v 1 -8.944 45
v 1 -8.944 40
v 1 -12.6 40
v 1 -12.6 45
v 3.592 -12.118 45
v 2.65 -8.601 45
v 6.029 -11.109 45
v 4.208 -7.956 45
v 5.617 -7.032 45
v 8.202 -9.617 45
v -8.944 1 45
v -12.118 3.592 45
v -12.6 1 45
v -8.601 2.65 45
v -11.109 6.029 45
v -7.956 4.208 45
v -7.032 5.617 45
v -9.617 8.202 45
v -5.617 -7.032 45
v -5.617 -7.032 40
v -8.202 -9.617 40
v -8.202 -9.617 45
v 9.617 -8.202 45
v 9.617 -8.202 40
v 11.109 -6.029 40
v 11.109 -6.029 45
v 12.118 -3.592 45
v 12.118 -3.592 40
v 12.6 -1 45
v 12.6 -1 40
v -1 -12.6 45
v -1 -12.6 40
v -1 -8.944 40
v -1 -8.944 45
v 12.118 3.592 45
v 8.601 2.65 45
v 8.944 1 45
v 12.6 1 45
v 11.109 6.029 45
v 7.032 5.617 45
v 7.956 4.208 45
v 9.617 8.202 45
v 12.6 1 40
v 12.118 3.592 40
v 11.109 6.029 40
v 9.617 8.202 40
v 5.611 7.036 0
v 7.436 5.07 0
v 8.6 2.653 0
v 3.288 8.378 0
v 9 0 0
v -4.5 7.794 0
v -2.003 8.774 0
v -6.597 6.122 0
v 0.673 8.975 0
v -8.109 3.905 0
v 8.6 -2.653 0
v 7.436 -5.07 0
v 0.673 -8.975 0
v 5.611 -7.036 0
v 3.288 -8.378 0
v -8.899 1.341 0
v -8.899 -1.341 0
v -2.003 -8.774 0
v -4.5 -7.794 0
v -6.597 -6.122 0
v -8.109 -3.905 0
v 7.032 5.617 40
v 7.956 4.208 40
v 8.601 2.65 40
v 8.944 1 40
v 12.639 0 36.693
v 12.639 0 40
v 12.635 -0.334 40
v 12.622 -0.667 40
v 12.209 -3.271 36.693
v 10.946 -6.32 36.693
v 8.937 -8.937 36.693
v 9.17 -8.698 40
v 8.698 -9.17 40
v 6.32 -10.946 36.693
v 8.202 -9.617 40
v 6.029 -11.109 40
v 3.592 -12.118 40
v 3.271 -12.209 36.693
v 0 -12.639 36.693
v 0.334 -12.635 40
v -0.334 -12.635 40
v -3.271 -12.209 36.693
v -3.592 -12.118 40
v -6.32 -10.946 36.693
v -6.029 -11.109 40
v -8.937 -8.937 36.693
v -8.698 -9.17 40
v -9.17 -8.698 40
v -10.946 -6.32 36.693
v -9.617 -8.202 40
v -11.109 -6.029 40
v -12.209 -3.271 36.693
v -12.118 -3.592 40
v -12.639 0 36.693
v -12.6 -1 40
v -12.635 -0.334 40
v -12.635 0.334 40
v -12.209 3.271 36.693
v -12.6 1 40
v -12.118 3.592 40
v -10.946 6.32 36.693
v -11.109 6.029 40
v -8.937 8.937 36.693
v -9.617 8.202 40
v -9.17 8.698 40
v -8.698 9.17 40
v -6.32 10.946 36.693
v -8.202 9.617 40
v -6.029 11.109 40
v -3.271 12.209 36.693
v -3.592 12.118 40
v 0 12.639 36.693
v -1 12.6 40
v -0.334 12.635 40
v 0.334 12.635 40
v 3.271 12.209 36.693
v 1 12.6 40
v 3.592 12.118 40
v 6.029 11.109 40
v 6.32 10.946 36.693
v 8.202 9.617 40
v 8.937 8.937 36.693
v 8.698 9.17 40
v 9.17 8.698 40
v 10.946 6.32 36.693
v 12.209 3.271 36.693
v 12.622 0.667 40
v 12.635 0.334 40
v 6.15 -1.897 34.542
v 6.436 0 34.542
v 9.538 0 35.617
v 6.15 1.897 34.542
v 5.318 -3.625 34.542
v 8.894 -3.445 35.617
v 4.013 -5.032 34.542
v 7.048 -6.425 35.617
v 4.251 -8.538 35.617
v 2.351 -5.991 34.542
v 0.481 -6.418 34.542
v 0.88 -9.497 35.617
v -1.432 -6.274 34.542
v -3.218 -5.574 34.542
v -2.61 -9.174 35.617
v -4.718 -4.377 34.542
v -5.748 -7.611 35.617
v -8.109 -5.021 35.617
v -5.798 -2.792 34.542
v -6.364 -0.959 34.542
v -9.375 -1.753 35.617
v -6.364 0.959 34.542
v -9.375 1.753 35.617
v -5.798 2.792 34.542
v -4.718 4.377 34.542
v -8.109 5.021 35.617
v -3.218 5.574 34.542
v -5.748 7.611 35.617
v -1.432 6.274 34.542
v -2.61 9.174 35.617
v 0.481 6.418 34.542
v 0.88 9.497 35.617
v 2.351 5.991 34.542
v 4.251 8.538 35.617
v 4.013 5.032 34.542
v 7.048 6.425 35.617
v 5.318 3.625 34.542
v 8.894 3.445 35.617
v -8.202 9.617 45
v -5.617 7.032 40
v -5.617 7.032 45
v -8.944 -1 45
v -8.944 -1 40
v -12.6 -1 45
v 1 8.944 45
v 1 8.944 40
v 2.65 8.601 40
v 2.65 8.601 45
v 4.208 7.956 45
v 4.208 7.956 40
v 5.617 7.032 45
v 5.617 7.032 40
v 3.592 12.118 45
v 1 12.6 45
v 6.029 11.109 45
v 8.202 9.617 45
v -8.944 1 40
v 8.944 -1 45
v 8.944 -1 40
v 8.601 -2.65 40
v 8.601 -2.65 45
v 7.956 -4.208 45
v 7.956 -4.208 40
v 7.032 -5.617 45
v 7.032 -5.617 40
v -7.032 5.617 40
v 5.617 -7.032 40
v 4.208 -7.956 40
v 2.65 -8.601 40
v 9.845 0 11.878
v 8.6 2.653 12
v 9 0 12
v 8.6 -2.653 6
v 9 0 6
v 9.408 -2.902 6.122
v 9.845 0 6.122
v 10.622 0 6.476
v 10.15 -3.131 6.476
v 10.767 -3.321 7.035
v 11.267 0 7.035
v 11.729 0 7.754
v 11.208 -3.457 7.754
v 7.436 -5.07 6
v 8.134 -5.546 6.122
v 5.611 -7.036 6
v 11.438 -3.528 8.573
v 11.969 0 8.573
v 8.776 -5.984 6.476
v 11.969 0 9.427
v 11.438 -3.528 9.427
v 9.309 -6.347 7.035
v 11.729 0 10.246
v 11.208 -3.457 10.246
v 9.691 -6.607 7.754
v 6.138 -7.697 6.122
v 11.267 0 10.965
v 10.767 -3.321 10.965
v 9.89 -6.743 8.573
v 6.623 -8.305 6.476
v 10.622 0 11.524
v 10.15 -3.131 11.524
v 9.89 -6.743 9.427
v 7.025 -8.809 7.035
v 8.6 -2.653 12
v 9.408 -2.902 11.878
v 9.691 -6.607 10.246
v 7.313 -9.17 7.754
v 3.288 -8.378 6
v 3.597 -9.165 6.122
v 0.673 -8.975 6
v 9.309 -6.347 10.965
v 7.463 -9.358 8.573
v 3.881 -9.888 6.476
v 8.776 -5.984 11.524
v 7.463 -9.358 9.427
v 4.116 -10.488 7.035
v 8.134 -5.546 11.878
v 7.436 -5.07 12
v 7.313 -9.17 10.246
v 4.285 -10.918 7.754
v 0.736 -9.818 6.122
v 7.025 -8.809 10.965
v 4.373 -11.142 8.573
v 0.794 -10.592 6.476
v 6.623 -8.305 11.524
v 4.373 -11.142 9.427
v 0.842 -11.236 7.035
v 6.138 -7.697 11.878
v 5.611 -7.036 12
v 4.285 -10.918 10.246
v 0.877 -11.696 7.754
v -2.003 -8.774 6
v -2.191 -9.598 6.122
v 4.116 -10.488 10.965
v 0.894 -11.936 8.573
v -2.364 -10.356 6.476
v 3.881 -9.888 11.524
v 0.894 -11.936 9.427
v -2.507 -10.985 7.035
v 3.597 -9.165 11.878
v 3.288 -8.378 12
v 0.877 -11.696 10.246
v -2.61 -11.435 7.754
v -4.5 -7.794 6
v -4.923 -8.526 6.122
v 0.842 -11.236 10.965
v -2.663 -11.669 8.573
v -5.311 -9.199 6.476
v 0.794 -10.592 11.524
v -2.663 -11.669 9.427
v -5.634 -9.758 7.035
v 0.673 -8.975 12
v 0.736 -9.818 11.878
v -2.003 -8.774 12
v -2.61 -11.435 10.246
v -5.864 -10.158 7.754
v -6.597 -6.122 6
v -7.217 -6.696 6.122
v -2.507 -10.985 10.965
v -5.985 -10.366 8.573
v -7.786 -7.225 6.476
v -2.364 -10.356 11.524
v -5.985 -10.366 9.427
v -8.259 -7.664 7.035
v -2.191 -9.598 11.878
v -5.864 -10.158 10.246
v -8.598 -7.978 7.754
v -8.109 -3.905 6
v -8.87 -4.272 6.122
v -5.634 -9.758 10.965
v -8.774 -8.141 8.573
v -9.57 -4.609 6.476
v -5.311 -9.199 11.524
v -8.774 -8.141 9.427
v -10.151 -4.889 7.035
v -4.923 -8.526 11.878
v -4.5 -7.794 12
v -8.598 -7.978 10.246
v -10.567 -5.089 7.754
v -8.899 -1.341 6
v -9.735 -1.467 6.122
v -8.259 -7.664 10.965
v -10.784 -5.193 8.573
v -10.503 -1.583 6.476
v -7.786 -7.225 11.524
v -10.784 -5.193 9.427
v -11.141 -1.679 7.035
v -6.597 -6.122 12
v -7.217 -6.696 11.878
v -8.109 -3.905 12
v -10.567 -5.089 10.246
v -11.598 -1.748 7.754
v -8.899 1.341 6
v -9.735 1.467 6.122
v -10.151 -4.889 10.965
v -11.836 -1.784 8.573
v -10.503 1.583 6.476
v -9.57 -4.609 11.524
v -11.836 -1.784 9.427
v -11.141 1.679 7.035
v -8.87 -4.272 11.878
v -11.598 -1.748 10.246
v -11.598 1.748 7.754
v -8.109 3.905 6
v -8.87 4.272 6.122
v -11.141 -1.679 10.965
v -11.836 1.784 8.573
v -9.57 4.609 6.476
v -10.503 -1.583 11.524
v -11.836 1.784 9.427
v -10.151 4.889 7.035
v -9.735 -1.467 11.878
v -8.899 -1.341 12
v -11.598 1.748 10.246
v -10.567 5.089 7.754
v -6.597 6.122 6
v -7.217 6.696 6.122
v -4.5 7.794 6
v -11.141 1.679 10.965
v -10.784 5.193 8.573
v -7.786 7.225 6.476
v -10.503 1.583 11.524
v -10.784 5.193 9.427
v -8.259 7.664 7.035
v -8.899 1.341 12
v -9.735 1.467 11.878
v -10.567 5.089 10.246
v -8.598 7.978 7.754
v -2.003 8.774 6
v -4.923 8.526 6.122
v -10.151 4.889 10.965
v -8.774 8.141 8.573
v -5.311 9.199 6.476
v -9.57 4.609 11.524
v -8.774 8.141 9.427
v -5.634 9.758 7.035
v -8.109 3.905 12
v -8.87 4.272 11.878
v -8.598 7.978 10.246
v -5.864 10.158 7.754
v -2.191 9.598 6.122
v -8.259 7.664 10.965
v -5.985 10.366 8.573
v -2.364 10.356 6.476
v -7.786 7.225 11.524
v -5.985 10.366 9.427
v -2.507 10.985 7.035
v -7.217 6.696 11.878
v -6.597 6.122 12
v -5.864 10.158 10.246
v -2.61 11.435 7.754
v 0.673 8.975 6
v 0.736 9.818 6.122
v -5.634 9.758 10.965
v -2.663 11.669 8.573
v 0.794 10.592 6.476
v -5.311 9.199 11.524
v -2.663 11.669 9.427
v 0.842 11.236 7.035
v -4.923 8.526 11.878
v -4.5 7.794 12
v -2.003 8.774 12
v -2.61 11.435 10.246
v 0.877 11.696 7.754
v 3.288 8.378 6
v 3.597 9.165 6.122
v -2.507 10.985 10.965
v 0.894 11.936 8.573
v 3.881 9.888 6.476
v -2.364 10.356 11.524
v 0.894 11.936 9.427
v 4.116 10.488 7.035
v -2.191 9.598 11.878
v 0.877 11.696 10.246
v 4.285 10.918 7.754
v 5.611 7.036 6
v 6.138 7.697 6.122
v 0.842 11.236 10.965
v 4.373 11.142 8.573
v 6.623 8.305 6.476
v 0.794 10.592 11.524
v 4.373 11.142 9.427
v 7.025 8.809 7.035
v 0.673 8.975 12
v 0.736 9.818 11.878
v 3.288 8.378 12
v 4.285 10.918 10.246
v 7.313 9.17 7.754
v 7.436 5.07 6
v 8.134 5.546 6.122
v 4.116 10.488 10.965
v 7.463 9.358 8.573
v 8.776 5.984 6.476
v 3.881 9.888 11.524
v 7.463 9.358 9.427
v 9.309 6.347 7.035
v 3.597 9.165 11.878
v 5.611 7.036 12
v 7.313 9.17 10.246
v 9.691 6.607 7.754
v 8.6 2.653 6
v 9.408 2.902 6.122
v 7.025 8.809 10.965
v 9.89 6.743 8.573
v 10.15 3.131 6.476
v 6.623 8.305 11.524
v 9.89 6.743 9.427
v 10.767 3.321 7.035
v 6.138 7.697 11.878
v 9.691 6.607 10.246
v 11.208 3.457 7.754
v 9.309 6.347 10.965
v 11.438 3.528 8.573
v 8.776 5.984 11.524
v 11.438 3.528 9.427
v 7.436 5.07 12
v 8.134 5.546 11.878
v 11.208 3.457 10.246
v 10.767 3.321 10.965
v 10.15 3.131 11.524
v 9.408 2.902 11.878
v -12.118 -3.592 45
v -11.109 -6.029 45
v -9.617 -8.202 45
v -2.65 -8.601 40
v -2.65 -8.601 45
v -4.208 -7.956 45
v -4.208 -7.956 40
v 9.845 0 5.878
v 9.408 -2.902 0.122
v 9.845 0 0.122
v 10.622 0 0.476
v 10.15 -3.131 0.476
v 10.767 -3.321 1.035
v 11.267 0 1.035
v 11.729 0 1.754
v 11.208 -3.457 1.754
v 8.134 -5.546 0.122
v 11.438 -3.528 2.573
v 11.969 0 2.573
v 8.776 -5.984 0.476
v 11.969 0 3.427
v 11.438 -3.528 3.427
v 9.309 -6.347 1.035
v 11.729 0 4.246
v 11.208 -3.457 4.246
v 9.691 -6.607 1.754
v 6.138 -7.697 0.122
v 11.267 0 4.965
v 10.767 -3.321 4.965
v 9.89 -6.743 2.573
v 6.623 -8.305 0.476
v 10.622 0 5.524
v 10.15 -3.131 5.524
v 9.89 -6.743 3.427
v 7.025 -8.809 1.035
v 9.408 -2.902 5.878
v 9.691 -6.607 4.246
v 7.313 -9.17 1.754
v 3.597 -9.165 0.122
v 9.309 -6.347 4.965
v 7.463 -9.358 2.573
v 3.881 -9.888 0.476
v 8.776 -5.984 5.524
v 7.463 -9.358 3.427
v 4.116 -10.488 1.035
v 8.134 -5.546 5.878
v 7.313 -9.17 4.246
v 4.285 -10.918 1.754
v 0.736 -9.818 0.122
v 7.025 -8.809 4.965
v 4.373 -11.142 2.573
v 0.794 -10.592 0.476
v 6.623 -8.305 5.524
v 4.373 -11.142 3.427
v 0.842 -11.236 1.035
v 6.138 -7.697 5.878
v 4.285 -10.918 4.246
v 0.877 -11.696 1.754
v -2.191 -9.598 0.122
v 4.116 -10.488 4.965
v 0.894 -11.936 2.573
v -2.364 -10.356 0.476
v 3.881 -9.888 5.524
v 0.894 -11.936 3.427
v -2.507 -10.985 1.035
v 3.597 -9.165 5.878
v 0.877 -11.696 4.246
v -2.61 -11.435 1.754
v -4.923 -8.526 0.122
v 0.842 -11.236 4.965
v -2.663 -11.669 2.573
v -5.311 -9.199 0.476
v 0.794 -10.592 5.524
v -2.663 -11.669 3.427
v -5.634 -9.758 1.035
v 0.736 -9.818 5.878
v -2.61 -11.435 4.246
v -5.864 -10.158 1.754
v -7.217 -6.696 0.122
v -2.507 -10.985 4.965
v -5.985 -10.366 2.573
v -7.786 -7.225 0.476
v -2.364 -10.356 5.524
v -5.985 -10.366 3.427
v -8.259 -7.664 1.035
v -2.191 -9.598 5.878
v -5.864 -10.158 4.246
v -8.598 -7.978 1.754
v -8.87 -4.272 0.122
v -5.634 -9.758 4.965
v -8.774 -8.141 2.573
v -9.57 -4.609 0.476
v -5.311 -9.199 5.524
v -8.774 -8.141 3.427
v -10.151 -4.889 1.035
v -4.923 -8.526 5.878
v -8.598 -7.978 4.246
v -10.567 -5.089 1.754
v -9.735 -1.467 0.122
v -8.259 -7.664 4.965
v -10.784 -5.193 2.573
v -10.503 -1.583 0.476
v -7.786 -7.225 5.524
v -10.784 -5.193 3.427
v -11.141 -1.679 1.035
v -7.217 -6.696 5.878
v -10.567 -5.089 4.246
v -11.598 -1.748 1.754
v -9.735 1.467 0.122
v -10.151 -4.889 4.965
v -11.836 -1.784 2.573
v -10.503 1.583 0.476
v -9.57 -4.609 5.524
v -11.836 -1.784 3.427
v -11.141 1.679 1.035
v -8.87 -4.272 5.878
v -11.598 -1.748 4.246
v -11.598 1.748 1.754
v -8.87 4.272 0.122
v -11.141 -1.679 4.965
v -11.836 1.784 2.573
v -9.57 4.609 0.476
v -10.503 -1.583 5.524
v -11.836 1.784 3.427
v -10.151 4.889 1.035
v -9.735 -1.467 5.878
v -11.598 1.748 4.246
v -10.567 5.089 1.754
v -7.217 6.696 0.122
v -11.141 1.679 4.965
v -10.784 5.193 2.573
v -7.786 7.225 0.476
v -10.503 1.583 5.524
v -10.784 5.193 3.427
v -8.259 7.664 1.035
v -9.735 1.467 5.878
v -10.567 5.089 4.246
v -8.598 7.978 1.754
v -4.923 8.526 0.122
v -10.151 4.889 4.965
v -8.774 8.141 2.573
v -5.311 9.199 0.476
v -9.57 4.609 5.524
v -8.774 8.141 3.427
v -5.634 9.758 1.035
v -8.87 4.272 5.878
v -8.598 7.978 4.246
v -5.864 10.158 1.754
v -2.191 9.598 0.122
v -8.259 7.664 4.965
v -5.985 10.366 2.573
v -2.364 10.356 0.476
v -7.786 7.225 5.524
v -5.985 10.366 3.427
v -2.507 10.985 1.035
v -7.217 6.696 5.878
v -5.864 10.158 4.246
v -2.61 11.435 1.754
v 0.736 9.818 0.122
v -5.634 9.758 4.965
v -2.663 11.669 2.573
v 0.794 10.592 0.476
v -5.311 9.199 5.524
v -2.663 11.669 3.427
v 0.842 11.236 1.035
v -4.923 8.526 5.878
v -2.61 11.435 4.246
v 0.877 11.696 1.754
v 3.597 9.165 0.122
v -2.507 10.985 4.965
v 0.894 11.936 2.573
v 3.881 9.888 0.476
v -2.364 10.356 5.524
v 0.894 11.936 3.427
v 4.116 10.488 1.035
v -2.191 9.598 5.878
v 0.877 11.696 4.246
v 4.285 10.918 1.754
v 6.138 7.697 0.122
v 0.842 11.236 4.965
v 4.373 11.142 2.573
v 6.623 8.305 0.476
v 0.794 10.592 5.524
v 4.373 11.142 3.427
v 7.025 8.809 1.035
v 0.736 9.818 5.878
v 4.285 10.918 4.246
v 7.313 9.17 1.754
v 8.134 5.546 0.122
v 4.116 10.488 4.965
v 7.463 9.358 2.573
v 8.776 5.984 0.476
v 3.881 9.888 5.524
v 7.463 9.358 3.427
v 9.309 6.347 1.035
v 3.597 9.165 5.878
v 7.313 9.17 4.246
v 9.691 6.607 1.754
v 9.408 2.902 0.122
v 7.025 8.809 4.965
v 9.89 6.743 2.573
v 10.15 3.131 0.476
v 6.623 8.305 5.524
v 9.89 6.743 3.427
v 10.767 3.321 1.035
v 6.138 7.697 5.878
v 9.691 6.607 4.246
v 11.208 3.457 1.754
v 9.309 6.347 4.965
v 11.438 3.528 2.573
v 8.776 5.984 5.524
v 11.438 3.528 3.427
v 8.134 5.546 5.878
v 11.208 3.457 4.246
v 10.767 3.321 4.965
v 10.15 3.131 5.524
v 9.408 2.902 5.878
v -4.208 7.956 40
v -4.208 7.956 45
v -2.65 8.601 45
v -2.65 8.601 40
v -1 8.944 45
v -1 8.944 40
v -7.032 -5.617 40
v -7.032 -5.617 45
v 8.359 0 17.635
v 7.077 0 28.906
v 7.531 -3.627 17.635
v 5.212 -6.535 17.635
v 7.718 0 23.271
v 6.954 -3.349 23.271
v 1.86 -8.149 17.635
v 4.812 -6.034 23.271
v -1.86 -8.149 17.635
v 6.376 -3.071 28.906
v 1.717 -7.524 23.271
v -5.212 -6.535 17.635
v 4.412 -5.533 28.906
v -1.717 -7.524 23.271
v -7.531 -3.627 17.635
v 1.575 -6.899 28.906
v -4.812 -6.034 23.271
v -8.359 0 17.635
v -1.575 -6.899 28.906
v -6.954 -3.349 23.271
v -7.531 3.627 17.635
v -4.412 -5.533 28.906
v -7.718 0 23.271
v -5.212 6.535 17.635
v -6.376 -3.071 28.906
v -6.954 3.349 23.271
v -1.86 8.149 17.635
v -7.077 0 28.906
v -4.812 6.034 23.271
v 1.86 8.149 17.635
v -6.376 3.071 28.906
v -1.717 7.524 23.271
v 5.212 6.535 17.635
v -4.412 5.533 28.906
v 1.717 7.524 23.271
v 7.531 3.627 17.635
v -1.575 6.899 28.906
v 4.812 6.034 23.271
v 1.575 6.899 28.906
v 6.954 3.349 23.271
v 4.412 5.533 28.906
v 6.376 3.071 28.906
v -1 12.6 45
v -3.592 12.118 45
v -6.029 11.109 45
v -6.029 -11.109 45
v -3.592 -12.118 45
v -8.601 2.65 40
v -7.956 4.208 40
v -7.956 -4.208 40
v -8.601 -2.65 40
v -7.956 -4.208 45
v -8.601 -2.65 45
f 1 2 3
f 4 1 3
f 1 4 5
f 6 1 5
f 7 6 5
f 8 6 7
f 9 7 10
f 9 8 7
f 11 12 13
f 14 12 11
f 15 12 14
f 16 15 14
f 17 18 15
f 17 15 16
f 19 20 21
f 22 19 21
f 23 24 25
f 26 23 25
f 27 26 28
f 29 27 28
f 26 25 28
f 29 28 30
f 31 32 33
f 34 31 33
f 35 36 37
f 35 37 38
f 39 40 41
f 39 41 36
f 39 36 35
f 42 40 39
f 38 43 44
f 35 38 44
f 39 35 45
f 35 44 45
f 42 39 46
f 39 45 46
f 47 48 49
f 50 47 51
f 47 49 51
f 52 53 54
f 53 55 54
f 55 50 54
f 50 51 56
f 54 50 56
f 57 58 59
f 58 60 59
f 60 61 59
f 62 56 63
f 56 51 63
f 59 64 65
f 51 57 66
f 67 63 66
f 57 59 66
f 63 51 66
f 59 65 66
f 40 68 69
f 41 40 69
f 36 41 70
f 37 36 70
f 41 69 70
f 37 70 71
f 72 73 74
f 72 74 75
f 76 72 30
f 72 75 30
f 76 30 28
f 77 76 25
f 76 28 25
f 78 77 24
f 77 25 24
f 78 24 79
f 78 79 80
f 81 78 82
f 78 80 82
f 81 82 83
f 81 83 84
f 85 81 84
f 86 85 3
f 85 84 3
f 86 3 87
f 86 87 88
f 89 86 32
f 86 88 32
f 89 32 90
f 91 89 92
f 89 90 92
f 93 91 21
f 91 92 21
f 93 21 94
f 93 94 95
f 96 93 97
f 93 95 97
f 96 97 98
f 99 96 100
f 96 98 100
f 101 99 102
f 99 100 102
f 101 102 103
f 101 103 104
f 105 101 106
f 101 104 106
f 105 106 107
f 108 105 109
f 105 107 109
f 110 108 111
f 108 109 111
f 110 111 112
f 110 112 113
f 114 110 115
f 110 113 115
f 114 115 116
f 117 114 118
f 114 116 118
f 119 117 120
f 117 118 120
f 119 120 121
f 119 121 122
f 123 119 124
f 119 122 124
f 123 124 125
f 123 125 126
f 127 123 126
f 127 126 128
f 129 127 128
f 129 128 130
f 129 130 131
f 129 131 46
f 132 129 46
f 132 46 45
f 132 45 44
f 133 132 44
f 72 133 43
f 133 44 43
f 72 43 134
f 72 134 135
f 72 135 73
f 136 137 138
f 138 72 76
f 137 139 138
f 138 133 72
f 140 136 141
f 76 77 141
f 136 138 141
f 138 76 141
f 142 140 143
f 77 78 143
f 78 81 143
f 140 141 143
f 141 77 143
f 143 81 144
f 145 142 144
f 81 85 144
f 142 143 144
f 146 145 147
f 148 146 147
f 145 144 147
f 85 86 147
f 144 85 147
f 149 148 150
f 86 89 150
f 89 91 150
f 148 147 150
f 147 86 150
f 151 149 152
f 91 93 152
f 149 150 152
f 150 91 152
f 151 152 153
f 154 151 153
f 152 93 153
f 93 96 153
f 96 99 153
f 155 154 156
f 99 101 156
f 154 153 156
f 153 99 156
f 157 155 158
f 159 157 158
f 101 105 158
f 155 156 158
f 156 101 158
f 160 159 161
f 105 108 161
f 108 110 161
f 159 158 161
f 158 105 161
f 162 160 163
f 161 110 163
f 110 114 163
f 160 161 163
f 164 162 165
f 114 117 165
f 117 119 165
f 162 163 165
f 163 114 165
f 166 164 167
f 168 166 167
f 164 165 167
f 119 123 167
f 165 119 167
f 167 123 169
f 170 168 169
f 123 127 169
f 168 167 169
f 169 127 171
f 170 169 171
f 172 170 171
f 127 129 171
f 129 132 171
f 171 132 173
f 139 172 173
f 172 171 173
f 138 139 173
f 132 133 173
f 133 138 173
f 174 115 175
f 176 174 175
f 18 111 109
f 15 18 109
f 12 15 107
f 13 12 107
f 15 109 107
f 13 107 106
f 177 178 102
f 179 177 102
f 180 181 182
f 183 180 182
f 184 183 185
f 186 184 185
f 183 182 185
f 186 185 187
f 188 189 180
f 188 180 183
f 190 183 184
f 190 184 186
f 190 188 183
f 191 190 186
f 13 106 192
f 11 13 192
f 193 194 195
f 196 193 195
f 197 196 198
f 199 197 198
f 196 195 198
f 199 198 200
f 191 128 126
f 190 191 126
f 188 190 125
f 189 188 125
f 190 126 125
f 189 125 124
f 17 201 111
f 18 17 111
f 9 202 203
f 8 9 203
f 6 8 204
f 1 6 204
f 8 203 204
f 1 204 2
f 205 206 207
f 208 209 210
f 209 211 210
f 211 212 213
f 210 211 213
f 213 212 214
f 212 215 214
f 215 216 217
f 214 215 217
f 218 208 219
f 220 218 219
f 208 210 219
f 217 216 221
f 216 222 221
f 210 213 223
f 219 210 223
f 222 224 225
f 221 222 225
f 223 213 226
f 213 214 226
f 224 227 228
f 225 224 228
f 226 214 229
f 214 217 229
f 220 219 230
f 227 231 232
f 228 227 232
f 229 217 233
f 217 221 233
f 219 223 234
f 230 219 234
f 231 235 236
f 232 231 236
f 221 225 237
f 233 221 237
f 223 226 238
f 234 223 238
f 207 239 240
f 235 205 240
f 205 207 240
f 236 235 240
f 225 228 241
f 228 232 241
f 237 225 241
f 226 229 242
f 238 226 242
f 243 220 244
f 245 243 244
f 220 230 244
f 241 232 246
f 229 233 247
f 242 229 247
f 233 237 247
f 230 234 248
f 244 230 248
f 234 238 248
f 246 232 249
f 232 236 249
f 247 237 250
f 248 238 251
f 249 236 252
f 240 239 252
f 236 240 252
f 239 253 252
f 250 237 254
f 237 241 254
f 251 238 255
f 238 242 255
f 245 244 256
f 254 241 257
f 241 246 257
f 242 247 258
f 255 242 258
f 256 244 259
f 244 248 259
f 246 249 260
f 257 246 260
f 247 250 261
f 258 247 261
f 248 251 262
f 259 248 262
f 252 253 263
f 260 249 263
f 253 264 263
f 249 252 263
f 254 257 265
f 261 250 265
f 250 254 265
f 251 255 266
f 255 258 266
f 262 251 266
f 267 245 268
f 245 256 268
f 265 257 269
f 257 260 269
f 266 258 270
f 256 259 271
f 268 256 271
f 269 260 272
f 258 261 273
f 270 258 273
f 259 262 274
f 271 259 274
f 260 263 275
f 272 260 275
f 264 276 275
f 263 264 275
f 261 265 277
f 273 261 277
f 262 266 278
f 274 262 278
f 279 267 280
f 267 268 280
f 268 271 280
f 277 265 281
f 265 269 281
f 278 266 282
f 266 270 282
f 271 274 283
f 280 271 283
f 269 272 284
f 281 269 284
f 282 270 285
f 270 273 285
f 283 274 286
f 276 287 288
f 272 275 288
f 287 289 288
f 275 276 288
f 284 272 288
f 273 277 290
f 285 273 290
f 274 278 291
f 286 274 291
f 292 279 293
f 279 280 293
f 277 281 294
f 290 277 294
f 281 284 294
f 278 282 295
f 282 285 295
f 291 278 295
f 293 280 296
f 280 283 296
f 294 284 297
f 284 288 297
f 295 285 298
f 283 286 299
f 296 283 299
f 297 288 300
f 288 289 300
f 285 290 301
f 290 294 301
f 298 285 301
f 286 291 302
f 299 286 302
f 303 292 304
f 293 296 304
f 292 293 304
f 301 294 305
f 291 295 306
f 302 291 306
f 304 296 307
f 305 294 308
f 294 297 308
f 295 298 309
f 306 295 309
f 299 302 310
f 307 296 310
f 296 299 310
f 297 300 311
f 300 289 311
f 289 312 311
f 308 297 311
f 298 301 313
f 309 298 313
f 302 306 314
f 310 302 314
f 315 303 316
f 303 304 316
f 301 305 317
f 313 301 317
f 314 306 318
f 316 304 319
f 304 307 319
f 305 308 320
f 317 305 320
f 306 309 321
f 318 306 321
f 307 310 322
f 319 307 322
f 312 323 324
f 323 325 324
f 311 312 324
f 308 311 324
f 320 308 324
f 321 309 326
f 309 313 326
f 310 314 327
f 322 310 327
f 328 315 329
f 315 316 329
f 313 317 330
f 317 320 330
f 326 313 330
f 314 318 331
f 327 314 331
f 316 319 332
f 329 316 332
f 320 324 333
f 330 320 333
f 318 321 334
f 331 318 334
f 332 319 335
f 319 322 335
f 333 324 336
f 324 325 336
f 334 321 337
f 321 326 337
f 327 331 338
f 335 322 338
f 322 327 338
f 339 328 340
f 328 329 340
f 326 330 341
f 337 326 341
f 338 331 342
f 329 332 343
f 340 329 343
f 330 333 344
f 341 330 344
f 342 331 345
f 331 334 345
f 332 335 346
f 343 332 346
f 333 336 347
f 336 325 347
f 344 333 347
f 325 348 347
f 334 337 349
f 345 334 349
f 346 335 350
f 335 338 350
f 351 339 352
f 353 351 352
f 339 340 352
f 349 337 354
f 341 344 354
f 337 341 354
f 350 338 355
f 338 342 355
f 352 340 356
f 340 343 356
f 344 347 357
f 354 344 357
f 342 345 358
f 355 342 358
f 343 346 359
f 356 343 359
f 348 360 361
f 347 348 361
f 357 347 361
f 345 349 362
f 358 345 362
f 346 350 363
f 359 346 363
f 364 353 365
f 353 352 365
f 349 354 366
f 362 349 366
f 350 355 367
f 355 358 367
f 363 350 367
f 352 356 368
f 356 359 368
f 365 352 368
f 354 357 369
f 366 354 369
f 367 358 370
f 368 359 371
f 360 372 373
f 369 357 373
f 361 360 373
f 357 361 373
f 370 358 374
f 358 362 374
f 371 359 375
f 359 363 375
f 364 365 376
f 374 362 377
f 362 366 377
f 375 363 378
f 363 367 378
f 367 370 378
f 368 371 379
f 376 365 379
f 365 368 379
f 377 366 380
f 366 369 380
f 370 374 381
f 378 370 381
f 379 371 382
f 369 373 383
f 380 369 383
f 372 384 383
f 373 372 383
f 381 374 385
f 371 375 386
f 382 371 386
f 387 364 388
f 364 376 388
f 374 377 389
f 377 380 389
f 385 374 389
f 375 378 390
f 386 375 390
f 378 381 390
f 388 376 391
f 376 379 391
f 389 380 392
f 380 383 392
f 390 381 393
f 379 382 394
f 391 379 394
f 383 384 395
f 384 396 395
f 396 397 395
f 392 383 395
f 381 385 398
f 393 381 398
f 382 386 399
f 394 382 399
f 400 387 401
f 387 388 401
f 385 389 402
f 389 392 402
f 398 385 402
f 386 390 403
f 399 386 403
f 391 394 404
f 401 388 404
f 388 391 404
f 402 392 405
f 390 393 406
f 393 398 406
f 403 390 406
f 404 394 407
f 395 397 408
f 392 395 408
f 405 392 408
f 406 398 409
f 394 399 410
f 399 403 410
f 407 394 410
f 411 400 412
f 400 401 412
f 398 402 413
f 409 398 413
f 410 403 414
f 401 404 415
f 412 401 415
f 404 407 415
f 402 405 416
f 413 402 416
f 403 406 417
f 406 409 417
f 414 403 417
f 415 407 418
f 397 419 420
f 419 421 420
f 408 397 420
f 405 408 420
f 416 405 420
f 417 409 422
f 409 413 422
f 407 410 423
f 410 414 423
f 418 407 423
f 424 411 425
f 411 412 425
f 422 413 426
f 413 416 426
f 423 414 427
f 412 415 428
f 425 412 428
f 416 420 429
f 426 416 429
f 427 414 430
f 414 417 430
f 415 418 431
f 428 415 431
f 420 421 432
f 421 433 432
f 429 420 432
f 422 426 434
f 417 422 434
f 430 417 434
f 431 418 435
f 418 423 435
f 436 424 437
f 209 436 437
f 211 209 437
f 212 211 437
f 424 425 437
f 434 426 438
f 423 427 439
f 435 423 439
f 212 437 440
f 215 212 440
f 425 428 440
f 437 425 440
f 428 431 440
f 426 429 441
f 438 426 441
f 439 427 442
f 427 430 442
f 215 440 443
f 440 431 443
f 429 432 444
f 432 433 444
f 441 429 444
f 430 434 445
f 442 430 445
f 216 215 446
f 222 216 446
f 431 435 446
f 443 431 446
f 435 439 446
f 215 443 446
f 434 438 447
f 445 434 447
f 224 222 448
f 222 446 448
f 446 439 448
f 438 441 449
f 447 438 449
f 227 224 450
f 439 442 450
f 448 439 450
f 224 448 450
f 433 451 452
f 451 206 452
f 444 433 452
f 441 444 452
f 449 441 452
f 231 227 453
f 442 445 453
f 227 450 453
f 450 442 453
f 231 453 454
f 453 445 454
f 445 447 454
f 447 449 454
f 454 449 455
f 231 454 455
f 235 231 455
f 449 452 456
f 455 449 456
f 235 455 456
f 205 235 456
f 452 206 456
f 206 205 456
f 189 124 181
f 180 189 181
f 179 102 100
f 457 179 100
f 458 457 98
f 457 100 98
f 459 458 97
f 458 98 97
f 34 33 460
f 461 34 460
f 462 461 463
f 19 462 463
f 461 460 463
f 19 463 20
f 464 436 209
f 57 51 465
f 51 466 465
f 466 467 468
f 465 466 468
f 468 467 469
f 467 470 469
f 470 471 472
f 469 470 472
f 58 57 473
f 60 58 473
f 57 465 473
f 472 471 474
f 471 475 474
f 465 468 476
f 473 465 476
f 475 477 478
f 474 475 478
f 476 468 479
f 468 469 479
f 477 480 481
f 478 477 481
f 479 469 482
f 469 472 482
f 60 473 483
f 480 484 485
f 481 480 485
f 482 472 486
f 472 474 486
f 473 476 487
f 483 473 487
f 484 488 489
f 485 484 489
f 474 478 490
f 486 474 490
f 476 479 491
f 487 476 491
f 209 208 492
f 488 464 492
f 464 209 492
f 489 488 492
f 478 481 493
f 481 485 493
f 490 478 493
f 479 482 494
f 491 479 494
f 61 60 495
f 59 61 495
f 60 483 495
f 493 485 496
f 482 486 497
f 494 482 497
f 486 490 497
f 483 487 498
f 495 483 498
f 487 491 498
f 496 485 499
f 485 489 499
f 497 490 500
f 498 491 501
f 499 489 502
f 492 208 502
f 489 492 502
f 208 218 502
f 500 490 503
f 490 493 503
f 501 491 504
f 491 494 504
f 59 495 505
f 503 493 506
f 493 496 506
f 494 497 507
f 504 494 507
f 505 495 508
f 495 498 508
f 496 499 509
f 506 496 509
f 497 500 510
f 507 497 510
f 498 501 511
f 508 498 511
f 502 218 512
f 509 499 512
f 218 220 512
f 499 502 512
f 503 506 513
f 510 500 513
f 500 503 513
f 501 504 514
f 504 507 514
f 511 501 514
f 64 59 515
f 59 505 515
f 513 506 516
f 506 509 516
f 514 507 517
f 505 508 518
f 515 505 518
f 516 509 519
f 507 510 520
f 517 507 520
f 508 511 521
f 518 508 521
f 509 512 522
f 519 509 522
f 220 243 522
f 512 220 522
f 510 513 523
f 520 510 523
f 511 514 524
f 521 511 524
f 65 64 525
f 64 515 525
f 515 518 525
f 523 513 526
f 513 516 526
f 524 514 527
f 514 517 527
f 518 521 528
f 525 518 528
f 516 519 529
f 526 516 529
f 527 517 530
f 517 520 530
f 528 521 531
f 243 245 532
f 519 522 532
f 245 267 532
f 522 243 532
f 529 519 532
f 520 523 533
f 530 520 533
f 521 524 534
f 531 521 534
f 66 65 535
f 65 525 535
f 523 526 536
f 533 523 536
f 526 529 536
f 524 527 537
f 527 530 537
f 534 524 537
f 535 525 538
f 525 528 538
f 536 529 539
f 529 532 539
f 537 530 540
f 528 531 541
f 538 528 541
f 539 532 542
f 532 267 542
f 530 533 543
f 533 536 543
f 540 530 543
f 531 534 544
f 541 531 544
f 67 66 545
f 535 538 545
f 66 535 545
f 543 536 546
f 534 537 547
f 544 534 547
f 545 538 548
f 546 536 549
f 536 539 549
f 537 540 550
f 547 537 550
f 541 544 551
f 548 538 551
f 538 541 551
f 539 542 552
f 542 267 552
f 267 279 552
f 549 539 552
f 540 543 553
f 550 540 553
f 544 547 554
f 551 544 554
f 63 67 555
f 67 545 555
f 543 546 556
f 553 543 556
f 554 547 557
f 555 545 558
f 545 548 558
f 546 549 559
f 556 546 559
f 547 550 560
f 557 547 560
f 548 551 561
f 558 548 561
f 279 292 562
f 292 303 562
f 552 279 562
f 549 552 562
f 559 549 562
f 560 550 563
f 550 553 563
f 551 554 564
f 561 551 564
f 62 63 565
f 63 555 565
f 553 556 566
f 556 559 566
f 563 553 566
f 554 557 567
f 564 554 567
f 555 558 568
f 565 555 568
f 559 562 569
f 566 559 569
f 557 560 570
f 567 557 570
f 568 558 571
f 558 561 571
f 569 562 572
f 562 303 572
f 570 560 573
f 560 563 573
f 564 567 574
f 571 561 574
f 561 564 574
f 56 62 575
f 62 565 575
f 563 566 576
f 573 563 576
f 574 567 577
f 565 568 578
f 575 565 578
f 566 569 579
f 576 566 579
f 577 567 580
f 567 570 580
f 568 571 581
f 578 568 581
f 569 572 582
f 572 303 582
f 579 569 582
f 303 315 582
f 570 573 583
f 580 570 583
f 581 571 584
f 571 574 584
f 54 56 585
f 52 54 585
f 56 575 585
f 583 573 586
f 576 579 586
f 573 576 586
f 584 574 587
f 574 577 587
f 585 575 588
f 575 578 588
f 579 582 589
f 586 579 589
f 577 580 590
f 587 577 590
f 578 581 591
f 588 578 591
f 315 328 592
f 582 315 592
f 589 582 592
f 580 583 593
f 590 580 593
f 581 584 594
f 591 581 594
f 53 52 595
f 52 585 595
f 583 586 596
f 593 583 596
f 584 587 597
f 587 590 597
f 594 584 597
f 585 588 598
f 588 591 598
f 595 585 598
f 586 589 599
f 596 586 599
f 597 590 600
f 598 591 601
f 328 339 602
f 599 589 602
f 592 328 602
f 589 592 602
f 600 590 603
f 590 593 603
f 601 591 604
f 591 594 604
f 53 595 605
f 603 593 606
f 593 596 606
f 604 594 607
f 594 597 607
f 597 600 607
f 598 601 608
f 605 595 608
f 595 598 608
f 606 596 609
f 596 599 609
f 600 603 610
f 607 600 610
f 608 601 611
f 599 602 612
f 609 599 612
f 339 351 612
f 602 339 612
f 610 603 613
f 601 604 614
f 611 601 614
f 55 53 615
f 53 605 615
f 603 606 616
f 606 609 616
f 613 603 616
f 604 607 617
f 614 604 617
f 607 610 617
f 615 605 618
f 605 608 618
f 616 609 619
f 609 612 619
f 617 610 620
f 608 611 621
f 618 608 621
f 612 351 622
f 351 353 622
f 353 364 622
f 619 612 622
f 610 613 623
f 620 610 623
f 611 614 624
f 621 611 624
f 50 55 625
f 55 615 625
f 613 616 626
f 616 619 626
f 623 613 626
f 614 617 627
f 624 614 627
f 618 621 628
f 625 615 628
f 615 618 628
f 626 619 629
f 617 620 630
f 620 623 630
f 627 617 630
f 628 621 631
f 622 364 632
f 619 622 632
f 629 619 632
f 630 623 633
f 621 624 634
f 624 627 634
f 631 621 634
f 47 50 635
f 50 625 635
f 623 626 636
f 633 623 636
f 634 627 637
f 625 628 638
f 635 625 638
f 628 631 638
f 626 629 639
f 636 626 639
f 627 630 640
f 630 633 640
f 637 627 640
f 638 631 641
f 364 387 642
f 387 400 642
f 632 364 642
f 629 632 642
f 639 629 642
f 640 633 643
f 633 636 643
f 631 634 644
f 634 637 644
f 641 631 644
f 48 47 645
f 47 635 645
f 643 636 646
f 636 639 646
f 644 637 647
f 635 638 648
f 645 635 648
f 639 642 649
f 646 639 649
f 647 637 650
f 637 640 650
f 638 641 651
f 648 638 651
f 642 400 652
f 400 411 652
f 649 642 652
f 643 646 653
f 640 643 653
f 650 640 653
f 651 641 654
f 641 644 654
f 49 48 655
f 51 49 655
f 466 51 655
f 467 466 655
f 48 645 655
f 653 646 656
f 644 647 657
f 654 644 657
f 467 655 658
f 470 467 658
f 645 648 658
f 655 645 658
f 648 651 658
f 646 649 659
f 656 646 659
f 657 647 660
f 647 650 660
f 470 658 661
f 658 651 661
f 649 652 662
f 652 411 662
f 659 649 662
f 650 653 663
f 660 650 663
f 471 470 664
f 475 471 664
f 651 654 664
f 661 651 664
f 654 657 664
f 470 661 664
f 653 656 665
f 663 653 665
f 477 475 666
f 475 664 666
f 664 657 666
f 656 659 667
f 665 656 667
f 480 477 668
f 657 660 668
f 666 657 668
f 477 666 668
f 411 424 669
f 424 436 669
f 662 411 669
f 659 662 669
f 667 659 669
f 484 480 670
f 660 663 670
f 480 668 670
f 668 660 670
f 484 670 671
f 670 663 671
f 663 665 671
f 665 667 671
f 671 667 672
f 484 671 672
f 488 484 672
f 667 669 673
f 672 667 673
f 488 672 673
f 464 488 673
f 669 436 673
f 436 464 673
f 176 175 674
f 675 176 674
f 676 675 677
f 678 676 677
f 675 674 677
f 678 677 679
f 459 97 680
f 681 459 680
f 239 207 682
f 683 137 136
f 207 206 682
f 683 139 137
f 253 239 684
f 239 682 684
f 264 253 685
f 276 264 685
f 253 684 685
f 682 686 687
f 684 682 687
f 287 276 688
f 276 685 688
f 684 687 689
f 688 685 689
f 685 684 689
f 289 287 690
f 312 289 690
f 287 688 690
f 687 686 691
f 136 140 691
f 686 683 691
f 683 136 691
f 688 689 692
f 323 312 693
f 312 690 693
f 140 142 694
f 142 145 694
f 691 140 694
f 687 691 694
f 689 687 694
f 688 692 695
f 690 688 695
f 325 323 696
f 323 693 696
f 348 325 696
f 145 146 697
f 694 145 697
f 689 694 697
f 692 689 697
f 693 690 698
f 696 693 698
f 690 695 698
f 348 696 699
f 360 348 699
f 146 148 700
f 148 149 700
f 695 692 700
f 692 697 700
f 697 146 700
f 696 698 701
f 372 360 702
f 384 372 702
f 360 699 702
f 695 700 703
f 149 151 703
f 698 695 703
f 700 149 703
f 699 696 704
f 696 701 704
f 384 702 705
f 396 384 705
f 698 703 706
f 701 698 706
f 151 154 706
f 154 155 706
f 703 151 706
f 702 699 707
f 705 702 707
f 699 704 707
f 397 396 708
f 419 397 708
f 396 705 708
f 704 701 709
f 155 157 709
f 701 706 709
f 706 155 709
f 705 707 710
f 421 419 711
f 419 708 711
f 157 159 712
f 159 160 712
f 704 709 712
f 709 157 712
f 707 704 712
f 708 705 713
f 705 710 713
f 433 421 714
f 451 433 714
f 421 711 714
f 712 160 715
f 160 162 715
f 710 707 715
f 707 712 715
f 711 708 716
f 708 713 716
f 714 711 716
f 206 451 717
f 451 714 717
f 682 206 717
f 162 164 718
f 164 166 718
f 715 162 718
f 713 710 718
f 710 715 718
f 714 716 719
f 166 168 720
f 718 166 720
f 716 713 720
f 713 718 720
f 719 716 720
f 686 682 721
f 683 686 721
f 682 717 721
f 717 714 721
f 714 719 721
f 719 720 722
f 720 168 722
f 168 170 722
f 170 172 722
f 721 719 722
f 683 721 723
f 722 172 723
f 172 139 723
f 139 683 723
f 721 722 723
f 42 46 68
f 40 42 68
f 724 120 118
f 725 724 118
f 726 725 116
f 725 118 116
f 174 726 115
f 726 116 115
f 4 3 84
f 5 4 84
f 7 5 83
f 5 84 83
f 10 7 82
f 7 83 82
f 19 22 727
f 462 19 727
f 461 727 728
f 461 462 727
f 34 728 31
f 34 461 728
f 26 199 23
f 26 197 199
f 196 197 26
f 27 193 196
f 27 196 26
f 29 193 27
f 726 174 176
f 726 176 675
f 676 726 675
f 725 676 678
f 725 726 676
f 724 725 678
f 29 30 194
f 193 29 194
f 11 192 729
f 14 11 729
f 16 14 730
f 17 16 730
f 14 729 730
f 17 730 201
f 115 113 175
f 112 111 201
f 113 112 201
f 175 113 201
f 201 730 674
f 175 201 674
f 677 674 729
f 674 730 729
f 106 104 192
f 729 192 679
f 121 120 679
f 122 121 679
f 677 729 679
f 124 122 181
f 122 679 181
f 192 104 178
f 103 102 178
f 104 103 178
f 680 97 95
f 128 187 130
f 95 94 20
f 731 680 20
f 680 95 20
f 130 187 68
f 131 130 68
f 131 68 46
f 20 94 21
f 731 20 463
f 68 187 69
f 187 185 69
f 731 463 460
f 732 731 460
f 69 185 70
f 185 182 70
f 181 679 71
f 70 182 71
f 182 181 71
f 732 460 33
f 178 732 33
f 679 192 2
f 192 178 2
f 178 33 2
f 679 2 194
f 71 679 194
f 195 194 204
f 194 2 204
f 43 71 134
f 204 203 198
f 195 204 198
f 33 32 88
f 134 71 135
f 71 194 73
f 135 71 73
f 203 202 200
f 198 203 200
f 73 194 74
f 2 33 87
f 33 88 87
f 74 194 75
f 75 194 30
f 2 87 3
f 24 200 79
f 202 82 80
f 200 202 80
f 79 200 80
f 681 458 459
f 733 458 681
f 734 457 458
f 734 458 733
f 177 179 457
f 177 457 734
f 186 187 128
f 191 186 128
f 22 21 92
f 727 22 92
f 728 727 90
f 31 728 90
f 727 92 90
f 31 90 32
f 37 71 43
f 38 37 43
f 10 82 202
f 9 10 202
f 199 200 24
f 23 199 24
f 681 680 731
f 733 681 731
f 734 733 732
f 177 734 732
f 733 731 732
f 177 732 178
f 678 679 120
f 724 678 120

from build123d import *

# Parameters (mm, degrees)
F3_DEPTH = 5


# Not quite as in the source:
# - after a boolean that leaves OpenCascade's solid faulty, fix() repairs it


with BuildPart() as f1:
    # F0 (on Front) → F1 (revolve)
    with BuildSketch(Plane.XZ):
        with BuildLine():
            Line((0, 40), (0, 0))
            Line((0, 0), (9, 0))
            ThreePointArc((9, 0), (12, 3), (9, 6))
            ThreePointArc((9, 6), (12, 9), (9, 12))
            Line((9, 12), (6.4358137697, 34.5418713987))
            Line((6.4358137697, 34.5418713987), (12.6394796214, 36.6926416755))
            Line((12.6394796214, 36.6926416755), (12.6394796214, 40))
            Line((12.6394796214, 40), (0, 40))
        make_face()
    revolve(axis=Axis((0, 0, 20), (0, 0, -1)))

    # F2 (on face) → F3 (join)
    with BuildSketch(Plane.XY.offset(40)):
        with BuildLine():
            ThreePointArc((-8.94427191, 1), (-8.3149157926, 3.4441508913), (-7.0316621015, 5.6174485392))
            Line((-7.0316621015, 5.6174485392), (-9.6165524738, 8.2023389114))
            ThreePointArc((-9.6165524738, 8.2023389114), (-11.6773565238, 4.8369194448), (-12.5998589317, 1))
            Line((-12.5998589317, 1), (-8.94427191, 1))
        make_face()
        with BuildLine():
            ThreePointArc((-1, 12.5998589317), (-4.8369194448, 11.6773565238), (-8.2023389114, 9.6165524738))
            Line((-8.2023389114, 9.6165524738), (-5.6174485392, 7.0316621015))
            ThreePointArc((-5.6174485392, 7.0316621015), (-3.4441508913, 8.3149157926), (-1, 8.94427191))
            Line((-1, 8.94427191), (-1, 12.5998589317))
        make_face()
        with BuildLine():
            ThreePointArc((8.2023389114, 9.6165524738), (4.8369194448, 11.6773565238), (1, 12.5998589317))
            Line((1, 12.5998589317), (1, 8.94427191))
            ThreePointArc((1, 8.94427191), (3.4441508913, 8.3149157926), (5.6174485392, 7.0316621015))
            Line((5.6174485392, 7.0316621015), (8.2023389114, 9.6165524738))
        make_face()
        with BuildLine():
            ThreePointArc((12.5998589317, 1), (11.6773565238, 4.8369194448), (9.6165524738, 8.2023389114))
            Line((9.6165524738, 8.2023389114), (7.0316621015, 5.6174485392))
            ThreePointArc((7.0316621015, 5.6174485392), (8.3149157926, 3.4441508913), (8.94427191, 1))
            Line((8.94427191, 1), (12.5998589317, 1))
        make_face()
        with BuildLine():
            Line((7.0316621015, -5.6174485392), (9.6165524738, -8.2023389114))
            ThreePointArc((9.6165524738, -8.2023389114), (11.6773565238, -4.8369194448), (12.5998589317, -1))
            Line((12.5998589317, -1), (8.94427191, -1))
            ThreePointArc((8.94427191, -1), (8.3149157926, -3.4441508913), (7.0316621015, -5.6174485392))
        make_face()
        with BuildLine():
            Line((1, -8.94427191), (1, -12.5998589317))
            ThreePointArc((1, -12.5998589317), (4.8369194448, -11.6773565238), (8.2023389114, -9.6165524738))
            Line((8.2023389114, -9.6165524738), (5.6174485392, -7.0316621015))
            ThreePointArc((5.6174485392, -7.0316621015), (3.4441508913, -8.3149157926), (1, -8.94427191))
        make_face()
        with BuildLine():
            Line((-5.6174485392, -7.0316621015), (-8.2023389114, -9.6165524738))
            ThreePointArc((-8.2023389114, -9.6165524738), (-4.8369194448, -11.6773565238), (-1, -12.5998589317))
            Line((-1, -12.5998589317), (-1, -8.94427191))
            ThreePointArc((-1, -8.94427191), (-3.4441508913, -8.3149157926), (-5.6174485392, -7.0316621015))
        make_face()
        with BuildLine():
            Line((-8.94427191, -1), (-12.5998589317, -1))
            ThreePointArc((-12.5998589317, -1), (-11.6773565238, -4.8369194448), (-9.6165524738, -8.2023389114))
            Line((-9.6165524738, -8.2023389114), (-7.0316621015, -5.6174485392))
            ThreePointArc((-7.0316621015, -5.6174485392), (-8.3149157926, -3.4441508913), (-8.94427191, -1))
        make_face()
    extrude(amount=F3_DEPTH)

    add(f1.part.fix(), mode=Mode.REPLACE)


solid = f1.part
